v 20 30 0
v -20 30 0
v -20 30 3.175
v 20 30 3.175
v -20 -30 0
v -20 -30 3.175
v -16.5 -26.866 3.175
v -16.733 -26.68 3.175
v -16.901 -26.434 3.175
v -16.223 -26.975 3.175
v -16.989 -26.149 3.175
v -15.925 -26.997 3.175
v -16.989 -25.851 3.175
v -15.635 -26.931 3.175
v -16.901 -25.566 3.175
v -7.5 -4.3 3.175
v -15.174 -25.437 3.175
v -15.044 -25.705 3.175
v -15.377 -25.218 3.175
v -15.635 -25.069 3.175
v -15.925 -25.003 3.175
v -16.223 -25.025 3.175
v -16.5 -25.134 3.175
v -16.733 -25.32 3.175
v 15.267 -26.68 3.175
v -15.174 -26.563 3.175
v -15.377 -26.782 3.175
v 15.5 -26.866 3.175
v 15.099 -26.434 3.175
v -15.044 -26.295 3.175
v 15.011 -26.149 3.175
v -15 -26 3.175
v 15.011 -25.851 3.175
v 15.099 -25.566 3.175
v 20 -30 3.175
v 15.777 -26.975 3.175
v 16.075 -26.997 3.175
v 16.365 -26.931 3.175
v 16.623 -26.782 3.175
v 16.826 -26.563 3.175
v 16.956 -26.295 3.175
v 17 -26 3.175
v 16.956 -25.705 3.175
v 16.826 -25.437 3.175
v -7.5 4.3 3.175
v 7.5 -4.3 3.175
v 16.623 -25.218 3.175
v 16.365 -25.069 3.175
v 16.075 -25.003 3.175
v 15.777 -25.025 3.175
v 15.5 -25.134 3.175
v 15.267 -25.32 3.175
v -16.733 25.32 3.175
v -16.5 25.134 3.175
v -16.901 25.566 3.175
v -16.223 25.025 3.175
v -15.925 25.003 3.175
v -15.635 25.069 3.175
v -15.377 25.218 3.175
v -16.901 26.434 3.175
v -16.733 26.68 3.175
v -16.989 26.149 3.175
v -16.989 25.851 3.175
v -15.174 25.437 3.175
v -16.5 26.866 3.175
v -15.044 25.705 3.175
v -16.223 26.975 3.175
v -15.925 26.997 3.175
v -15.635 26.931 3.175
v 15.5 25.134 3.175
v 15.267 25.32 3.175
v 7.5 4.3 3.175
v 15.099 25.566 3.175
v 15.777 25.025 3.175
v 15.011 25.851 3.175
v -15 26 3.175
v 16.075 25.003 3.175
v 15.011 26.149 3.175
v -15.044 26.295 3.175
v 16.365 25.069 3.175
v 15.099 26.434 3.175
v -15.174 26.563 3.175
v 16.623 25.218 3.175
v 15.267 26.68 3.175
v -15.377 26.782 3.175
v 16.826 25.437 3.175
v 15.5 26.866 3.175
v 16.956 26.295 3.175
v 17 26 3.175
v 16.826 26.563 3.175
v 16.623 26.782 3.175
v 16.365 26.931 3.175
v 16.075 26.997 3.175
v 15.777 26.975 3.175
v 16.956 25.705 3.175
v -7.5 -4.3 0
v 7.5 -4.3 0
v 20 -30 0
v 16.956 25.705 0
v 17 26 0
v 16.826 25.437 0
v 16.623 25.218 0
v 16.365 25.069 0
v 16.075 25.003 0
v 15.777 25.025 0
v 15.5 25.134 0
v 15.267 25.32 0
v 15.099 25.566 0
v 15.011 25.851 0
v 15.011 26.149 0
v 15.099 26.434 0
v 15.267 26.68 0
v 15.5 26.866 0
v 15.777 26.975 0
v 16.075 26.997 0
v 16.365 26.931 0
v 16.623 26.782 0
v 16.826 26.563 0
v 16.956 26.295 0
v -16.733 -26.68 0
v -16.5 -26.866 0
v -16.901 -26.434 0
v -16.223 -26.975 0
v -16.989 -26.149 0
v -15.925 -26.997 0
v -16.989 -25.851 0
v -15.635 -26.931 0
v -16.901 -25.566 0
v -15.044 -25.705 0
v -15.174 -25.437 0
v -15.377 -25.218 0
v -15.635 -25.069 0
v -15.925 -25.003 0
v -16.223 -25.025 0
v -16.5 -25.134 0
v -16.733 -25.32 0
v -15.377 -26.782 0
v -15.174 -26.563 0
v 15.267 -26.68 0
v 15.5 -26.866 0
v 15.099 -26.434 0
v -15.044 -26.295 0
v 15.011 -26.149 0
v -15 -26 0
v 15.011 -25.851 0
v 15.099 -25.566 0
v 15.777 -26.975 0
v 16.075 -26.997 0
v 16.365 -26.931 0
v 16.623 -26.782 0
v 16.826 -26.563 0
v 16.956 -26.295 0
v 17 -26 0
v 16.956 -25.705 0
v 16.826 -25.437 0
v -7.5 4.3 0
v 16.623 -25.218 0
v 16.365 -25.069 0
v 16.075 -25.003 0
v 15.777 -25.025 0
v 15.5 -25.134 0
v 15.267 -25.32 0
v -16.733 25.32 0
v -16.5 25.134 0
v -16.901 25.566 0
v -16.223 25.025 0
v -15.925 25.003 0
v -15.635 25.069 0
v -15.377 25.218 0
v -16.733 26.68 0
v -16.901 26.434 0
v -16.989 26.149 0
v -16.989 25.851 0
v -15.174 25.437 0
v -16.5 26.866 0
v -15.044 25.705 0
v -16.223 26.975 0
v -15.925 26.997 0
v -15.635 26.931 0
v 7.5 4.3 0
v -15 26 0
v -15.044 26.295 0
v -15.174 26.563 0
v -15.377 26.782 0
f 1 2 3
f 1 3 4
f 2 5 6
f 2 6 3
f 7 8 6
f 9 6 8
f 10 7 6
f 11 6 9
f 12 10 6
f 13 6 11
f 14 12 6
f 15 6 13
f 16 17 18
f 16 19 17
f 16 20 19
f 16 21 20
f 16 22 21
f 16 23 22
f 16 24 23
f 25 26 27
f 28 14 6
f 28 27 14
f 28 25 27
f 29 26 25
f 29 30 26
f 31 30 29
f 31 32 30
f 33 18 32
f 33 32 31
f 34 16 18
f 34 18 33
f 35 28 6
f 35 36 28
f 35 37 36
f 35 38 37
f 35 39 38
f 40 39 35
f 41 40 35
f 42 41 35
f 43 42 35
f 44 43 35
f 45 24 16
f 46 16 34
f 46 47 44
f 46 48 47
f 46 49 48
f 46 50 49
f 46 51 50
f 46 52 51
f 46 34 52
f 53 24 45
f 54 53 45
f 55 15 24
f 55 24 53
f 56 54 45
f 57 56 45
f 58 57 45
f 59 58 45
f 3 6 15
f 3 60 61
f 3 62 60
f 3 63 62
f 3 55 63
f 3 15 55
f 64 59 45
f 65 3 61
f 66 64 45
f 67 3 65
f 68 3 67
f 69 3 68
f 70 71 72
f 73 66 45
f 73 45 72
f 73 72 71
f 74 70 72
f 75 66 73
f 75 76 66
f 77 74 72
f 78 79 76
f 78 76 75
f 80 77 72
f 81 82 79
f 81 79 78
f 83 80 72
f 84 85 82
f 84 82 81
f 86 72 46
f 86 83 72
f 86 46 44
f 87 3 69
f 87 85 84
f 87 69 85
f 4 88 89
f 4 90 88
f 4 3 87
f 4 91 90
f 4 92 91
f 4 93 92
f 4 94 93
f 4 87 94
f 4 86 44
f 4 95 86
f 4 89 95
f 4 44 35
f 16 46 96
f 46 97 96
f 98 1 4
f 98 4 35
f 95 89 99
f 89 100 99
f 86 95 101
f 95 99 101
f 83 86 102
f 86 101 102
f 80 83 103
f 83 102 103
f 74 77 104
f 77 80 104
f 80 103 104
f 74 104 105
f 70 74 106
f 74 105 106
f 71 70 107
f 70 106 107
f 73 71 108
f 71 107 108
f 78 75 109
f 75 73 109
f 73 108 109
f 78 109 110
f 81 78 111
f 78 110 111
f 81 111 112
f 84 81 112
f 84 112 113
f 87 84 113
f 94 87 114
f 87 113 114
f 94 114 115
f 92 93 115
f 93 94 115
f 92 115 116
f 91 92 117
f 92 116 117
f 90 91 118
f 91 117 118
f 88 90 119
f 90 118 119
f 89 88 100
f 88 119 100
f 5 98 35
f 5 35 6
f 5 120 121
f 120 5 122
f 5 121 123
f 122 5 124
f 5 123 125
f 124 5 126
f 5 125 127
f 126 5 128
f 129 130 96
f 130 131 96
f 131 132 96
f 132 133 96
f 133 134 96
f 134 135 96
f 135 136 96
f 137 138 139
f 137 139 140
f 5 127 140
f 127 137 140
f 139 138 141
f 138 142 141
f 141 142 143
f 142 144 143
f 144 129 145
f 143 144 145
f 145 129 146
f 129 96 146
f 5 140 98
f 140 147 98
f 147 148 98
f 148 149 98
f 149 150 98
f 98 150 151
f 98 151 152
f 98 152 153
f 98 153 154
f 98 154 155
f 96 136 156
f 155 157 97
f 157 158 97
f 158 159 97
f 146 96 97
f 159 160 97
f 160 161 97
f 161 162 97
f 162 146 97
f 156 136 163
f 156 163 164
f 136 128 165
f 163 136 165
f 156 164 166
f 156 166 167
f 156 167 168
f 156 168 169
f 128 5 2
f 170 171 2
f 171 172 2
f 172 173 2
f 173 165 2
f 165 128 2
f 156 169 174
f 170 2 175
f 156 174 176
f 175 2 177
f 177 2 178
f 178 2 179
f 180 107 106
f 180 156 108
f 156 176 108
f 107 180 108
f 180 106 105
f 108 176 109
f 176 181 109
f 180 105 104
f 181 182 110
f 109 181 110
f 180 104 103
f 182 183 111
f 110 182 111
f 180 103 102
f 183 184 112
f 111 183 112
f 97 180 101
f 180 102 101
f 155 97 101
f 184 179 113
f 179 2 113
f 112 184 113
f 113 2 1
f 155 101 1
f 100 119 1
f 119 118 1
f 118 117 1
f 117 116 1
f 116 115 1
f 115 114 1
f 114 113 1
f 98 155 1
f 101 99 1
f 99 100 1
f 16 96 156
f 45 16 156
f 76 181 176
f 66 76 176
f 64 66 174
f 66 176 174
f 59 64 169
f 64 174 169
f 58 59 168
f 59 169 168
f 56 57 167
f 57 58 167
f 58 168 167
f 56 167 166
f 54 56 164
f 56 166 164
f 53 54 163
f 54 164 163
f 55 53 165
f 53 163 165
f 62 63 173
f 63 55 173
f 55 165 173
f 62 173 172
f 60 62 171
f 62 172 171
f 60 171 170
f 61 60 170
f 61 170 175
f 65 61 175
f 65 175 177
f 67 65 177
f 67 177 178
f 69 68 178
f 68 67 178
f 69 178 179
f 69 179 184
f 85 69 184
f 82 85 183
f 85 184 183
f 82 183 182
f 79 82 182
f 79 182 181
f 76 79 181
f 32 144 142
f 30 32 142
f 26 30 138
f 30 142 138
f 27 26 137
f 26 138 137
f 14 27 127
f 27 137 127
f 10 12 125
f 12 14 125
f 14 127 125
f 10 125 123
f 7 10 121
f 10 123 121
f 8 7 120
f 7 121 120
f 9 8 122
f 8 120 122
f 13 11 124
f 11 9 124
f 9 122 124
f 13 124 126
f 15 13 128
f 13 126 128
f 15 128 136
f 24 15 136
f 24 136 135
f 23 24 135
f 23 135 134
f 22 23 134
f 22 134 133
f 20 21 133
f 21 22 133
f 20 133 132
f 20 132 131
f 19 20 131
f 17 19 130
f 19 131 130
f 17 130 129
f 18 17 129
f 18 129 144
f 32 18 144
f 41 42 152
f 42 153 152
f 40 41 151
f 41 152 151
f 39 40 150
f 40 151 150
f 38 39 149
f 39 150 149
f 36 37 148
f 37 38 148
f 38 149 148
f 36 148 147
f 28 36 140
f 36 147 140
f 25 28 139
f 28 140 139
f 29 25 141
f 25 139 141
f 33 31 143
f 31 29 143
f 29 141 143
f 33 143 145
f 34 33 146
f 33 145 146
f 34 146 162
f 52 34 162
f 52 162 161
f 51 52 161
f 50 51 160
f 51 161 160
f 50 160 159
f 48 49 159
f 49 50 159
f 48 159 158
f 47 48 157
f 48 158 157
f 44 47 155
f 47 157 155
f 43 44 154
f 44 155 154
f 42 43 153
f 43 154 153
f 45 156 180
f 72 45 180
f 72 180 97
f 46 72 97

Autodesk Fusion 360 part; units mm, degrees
sketch "Sketch1" plane through (0, 0, 0) normal (0, 0, 1) x (1, 0, 0)
  line L0 (-16, 26) -> (16, 26) construction
  line L1 (16, 26) -> (16, -26) construction
  line L2 (16, -26) -> (-16, -26) construction
  line L3 (-16, -26) -> (-16, 26) construction
  line L4 (-16, 26) -> (16, -26) construction
  line L5 (16, 26) -> (-16, -26) construction
  line L6 (-7.5, 4.3) -> (7.5, 4.3)
  line L7 (7.5, 4.3) -> (7.5, -4.3)
  line L8 (7.5, -4.3) -> (-7.5, -4.3)
  line L9 (-7.5, -4.3) -> (-7.5, 4.3)
  line L10 (-7.5, 4.3) -> (7.5, -4.3) construction
  line L11 (7.5, 4.3) -> (-7.5, -4.3) construction
  line L12 (-20, 30) -> (20, 30)
  line L13 (20, 30) -> (20, -30)
  line L14 (20, -30) -> (-20, -30)
  line L15 (-20, -30) -> (-20, 30)
  line L16 (-20, 30) -> (20, -30) construction
  line L17 (20, 30) -> (-20, -30) construction
  circle A0 centre (-16, -26) radius 1
  circle A1 centre (16, -26) radius 1
  circle A2 centre (-16, 26) radius 1
  circle A3 centre (16, 26) radius 1
  dimension "d1" = 32
  dimension "d2" = 52
  dimension "d3" = 15
  dimension "d4" = 8.6
  dimension "d5" = 40
  dimension "d6" = 60
  dimension "d7" = 2
  dimension "d8" = 2
  dimension "d9" = 2
  dimension "d10" = 2
extrude "Extrude1" add sketch "Sketch1" along normal blind 3.175
